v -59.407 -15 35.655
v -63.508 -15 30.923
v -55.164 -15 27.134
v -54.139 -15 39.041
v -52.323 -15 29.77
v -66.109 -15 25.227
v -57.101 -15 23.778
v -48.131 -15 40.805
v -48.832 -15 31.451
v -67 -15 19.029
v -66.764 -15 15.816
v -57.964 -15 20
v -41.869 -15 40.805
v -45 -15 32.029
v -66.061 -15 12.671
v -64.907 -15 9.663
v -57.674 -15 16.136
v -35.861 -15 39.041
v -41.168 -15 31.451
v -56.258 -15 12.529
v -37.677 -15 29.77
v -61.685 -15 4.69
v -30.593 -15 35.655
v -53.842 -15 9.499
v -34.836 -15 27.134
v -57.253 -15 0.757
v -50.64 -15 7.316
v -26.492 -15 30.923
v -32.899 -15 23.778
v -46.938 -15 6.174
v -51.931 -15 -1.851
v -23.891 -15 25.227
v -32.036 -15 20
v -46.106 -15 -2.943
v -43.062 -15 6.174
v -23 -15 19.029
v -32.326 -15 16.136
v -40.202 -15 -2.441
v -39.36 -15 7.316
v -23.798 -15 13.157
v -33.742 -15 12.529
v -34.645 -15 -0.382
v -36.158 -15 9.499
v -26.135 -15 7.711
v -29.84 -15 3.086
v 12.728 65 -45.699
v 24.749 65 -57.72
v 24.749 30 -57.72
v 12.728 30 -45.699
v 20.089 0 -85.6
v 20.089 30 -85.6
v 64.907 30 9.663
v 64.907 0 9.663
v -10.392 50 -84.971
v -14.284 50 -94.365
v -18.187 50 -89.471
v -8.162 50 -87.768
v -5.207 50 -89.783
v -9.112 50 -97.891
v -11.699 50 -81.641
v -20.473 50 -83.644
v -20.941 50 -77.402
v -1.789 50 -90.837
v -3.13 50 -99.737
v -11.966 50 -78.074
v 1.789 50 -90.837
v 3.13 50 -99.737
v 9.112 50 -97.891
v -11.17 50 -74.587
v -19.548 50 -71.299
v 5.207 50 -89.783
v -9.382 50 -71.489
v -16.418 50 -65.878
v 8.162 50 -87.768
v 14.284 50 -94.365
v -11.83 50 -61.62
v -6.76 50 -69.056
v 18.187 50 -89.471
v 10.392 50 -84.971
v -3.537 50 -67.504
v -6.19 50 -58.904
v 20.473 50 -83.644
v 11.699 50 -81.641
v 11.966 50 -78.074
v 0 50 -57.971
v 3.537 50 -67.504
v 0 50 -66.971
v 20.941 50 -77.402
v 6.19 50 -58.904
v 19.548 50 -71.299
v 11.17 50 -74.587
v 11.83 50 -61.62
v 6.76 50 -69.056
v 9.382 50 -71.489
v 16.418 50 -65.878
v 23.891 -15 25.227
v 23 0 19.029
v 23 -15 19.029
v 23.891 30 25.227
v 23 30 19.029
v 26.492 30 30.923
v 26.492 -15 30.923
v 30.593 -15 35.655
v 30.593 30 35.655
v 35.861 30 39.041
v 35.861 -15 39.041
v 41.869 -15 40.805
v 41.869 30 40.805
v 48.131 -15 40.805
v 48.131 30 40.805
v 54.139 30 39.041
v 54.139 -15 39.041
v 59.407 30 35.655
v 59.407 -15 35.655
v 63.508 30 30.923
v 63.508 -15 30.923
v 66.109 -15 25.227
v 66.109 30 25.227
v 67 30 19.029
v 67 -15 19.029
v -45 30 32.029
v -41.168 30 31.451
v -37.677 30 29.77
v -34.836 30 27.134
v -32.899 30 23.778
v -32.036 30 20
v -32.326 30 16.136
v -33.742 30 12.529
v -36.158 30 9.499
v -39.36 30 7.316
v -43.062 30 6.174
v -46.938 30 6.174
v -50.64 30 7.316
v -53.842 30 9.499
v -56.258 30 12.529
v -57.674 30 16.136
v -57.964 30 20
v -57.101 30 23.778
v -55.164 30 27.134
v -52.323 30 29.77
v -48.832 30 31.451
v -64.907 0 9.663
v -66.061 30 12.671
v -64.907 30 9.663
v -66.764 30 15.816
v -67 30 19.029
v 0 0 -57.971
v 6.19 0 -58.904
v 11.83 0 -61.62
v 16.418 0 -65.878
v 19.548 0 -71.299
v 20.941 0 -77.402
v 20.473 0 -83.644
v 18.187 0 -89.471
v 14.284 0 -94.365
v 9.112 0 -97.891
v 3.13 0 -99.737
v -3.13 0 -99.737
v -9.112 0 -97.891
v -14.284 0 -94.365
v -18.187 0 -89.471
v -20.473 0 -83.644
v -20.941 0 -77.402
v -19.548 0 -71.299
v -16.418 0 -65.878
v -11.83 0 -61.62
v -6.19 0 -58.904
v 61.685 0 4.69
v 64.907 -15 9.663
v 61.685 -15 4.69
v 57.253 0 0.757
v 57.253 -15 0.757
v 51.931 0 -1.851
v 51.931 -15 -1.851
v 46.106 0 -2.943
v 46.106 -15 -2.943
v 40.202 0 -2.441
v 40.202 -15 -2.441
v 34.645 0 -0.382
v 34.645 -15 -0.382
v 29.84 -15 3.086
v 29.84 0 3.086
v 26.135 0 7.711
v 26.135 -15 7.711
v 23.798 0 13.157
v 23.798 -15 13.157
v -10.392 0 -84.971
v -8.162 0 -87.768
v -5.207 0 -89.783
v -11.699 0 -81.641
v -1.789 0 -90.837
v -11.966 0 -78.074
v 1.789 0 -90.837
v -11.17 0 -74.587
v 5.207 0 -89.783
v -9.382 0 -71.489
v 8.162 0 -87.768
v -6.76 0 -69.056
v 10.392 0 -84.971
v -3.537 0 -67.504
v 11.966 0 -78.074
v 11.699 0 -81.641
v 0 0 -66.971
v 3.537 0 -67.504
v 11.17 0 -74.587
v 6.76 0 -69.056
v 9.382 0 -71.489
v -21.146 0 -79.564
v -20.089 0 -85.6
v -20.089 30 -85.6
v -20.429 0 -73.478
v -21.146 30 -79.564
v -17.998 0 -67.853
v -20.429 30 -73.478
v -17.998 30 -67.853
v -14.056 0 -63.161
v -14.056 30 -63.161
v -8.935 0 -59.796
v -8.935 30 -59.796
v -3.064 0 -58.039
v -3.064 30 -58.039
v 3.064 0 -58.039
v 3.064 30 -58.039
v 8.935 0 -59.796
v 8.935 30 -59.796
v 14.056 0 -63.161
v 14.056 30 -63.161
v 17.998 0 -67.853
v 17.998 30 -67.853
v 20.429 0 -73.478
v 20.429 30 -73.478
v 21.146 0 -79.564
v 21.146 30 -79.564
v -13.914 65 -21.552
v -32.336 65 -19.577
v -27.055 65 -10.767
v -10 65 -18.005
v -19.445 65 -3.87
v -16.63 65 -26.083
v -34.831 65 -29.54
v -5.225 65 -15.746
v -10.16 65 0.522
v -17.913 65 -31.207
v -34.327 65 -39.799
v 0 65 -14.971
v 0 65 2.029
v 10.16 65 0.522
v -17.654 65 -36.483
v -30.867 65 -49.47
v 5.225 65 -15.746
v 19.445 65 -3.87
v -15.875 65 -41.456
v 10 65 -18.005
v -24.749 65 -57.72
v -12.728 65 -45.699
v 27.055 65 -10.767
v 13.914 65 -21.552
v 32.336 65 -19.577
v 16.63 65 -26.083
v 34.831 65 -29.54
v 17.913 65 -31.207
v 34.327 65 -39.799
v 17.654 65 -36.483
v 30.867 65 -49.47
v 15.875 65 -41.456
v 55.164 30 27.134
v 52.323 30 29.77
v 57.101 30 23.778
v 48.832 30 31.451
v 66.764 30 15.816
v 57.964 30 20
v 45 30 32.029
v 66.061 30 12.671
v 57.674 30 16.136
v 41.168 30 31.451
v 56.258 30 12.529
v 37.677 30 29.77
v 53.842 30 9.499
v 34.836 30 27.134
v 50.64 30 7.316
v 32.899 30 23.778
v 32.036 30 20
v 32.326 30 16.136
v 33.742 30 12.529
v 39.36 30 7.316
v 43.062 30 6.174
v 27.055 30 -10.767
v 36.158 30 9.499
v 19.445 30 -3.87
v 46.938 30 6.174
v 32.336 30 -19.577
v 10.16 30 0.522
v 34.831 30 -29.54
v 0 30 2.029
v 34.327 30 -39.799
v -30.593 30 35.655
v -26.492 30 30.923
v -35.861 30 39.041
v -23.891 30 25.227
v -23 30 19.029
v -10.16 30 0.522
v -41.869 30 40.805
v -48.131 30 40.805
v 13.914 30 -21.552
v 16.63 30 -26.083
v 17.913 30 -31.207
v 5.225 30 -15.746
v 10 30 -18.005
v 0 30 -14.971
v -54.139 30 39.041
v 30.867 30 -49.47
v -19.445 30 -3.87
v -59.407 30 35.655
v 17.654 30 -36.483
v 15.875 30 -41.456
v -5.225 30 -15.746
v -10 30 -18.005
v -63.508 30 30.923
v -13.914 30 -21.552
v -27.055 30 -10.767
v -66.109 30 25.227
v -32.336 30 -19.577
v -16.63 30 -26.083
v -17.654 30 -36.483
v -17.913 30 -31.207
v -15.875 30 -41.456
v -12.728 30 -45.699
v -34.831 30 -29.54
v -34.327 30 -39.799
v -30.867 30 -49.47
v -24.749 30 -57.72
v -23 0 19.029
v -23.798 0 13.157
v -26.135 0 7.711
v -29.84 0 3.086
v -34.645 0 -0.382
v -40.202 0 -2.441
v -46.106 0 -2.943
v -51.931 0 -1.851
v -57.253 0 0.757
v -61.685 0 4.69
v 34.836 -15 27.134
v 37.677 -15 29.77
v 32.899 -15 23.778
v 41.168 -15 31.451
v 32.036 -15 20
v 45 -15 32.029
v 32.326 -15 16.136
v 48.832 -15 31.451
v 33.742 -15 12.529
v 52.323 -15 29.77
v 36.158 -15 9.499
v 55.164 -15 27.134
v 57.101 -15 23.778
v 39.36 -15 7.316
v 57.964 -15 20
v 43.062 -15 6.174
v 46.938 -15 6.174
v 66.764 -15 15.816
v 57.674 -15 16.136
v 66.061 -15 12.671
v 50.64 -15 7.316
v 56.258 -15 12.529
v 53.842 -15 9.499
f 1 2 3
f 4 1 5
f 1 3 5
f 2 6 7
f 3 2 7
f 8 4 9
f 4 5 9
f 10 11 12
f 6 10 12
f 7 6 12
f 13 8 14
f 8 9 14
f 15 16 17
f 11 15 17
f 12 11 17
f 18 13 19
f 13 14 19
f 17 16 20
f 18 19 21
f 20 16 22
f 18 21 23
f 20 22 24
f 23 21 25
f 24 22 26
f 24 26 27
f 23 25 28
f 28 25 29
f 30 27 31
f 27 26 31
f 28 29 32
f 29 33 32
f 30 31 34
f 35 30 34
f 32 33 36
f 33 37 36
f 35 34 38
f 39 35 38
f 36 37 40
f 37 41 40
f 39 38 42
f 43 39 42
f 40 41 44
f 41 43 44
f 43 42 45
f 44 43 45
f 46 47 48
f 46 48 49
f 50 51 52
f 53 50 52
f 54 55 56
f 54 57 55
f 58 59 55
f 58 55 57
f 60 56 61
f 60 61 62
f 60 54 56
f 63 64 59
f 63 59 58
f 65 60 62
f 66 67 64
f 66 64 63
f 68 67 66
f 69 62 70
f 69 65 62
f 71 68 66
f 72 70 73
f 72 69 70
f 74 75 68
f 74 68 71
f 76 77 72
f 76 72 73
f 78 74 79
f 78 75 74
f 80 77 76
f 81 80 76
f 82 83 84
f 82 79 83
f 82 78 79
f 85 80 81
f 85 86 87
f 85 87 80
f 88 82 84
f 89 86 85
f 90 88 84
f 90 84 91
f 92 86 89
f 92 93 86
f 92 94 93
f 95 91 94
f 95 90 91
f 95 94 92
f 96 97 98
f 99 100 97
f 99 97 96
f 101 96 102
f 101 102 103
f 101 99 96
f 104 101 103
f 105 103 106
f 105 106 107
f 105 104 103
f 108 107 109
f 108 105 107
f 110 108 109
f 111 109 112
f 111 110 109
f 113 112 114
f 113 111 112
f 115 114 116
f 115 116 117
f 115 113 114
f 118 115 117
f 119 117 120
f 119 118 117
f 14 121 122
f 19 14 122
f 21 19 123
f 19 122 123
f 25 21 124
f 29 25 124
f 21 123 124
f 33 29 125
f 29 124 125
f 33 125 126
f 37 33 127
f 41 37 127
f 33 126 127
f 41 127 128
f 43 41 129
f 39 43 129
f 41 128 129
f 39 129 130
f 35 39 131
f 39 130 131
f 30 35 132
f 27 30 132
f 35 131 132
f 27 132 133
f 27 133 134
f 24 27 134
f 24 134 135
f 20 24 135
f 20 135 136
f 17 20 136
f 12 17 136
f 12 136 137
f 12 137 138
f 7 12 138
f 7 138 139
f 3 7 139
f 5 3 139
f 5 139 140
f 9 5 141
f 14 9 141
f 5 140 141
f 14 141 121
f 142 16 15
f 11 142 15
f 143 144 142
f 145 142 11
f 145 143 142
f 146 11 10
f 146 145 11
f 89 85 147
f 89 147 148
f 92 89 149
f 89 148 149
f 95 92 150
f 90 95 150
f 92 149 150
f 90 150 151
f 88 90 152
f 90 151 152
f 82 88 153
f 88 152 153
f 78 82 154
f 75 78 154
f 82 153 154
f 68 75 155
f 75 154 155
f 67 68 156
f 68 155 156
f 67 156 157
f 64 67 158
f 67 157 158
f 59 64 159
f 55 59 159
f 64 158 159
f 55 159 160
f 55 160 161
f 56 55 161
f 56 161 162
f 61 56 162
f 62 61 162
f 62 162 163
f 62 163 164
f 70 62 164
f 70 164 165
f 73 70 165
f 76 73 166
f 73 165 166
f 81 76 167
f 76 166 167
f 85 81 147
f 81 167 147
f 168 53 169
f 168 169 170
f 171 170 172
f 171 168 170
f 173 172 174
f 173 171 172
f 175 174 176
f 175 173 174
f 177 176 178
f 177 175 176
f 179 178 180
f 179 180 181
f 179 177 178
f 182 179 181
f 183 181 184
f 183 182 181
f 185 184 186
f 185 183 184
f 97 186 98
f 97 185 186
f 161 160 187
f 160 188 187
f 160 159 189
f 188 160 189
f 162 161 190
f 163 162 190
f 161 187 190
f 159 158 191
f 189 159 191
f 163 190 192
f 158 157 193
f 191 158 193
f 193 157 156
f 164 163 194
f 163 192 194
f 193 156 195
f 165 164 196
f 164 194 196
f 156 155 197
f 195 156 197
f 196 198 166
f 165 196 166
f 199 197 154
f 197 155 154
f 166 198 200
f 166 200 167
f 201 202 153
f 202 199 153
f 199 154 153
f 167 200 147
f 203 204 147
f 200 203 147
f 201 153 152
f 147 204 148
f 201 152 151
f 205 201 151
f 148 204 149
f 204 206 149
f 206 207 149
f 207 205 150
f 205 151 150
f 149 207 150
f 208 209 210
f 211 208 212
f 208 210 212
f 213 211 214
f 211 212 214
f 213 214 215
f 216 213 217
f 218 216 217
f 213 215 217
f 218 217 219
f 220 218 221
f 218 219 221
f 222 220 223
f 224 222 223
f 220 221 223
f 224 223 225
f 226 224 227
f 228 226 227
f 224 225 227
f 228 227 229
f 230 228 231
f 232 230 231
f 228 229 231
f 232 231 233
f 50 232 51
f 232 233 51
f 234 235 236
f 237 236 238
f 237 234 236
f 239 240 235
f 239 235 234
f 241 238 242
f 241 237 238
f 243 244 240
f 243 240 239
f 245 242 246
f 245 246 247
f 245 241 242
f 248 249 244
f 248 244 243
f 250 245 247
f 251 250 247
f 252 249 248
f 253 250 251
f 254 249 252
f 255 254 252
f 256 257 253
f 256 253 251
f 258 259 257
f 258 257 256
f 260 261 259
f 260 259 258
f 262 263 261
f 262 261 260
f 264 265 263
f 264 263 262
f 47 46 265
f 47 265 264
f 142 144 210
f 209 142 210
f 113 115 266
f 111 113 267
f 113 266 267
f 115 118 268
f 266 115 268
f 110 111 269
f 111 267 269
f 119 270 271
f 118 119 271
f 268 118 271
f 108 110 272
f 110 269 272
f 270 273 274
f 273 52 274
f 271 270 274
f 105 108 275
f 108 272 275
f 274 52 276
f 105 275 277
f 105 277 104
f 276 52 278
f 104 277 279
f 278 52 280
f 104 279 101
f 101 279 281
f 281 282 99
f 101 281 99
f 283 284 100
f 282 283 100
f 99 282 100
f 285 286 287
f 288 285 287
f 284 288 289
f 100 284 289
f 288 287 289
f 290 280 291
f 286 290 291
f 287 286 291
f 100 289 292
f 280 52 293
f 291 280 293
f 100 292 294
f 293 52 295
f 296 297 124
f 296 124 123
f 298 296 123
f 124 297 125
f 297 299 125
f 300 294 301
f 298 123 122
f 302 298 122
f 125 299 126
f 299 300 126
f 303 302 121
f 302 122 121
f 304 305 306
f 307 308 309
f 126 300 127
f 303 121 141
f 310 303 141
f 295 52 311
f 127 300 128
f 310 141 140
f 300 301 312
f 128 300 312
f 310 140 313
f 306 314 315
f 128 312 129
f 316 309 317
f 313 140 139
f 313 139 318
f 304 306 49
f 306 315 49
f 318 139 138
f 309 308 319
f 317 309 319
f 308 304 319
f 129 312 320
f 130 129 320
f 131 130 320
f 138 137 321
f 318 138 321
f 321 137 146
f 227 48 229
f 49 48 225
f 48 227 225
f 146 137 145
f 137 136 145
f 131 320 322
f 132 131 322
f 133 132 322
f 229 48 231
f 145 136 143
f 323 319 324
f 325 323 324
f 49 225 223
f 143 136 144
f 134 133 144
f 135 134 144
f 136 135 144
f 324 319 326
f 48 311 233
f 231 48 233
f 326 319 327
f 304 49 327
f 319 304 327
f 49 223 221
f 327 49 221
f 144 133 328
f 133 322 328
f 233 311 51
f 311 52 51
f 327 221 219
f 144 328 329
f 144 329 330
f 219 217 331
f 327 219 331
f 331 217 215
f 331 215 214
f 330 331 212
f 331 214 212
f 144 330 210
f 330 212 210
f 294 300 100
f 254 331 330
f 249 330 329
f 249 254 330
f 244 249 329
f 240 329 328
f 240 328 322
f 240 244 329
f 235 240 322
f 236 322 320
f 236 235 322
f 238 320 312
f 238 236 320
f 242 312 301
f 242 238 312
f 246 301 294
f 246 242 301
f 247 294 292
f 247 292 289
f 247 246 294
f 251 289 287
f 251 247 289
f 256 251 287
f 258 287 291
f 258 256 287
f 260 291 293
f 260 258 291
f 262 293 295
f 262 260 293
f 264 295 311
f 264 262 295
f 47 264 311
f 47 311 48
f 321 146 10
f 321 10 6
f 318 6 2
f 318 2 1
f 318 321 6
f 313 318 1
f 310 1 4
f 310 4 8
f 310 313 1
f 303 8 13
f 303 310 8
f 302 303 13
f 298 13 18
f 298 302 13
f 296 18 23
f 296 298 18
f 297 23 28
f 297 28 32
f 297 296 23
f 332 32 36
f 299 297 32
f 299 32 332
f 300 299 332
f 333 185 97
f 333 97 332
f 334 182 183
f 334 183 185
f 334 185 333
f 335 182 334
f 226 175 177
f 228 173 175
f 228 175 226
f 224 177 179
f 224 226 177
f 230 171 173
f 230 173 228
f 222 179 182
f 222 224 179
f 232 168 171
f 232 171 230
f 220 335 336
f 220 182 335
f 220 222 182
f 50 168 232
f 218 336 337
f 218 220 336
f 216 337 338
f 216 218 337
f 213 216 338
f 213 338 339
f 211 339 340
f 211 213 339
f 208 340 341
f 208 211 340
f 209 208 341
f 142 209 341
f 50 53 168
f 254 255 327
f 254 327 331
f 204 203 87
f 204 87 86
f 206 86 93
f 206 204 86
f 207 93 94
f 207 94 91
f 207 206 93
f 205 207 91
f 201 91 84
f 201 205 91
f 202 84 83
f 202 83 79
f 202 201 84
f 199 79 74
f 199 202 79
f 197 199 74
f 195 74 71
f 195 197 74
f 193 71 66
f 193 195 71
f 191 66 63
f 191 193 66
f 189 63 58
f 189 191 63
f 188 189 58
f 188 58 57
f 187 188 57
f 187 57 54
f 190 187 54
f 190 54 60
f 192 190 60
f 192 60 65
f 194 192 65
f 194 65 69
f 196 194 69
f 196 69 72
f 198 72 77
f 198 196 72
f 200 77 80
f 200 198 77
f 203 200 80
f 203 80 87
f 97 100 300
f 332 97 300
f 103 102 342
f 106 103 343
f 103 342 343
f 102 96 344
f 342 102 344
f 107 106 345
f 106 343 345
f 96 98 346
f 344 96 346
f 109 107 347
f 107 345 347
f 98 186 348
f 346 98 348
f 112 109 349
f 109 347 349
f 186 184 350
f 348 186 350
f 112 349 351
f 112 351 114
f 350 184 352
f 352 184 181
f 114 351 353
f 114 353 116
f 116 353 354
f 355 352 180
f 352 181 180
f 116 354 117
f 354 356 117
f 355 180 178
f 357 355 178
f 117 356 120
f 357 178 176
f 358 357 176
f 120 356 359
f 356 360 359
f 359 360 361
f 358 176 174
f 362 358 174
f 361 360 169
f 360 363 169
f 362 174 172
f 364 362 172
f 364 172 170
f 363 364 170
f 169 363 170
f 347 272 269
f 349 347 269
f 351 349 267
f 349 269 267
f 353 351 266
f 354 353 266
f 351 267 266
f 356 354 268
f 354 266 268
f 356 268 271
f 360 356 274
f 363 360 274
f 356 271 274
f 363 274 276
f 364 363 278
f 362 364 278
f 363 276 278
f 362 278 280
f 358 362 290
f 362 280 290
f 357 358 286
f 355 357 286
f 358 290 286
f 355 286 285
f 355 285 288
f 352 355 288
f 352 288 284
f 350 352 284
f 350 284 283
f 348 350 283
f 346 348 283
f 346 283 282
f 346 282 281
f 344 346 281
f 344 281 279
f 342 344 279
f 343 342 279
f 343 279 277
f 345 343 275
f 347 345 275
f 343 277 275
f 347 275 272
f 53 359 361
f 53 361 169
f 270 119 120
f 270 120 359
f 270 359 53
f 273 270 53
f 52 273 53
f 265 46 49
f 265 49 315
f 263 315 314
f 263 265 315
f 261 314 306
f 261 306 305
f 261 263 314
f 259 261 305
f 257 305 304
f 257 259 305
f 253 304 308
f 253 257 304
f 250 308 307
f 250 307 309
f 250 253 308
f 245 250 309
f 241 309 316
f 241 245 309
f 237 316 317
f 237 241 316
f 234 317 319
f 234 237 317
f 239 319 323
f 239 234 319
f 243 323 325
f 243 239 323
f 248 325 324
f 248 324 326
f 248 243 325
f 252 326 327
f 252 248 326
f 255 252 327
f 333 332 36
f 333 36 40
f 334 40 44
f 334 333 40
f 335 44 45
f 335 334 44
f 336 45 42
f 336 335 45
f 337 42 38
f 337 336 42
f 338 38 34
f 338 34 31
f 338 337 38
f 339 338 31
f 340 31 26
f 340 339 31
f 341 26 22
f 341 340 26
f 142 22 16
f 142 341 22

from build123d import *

# Parameters (mm, degrees)
SKETCH1_R             = 21
SKETCH1_R_2           = 12
BOSS_EXTRUDE1_DEPTH   = 50
SKETCH2_R             = 13
BOSS_EXTRUDE2_DEPTH   = 45
BOSS_EXTRUDE2_2_DEPTH = 45
BOSS_EXTRUDE3_DEPTH   = 30
BOSS_EXTRUDE4_DEPTH   = 35


with BuildPart() as part:
    # Sketch1 → Boss-Extrude1 (new body)
    with BuildSketch(Plane(origin=(0, 0, 0), x_dir=(1, 0, 0), z_dir=(0, 1, 0))):
        with Locations(Location((0, 78.9710862, 0), (0, 0, 270))):
            Circle(SKETCH1_R)
        with Locations(Location((0, 78.9710862, 0), (0, 0, 270))):
            Circle(SKETCH1_R_2, mode=Mode.SUBTRACT)
    extrude(amount=BOSS_EXTRUDE1_DEPTH)


with BuildPart() as body_2:
    # Sketch2 → Boss-Extrude2 (new body)
    with BuildSketch(Plane(origin=(0, 30, 0), x_dir=(1, 0, 0), z_dir=(0, 1, 0))):
        with BuildLine():
            ThreePointArc((-23, -19.0289138), (-40.201759921, 2.441458626), (-64.906990195, -9.663459119))
            ThreePointArc((-64.906990195, -9.663459119), (-66.470372427, -14.230673721), (-67, -19.0289138))
            ThreePointArc((-67, -19.0289138), (-45, -41.0289138), (-23, -19.0289138))
        make_face()
        with Locations(Location((-45, -19.0289138, 0), (0, 0, 270))):
            Circle(SKETCH2_R, mode=Mode.SUBTRACT)
    extrude(amount=-BOSS_EXTRUDE2_DEPTH)



with BuildPart() as body_3:
    # Sketch2 → Boss-Extrude2 2 (new body)
    with BuildSketch(Plane(origin=(0, 30, 0), x_dir=(1, 0, 0), z_dir=(0, 1, 0))):
        with BuildLine():
            ThreePointArc((64.906990195, -9.663459119), (40.201759921, 2.441458626), (23, -19.0289138))
            ThreePointArc((23, -19.0289138), (45, -41.0289138), (67, -19.0289138))
            ThreePointArc((67, -19.0289138), (66.470372427, -14.230673721), (64.906990195, -9.663459119))
        make_face()
        with Locations(Location((45, -19.0289138, 0), (0, 0, 270))):
            Circle(SKETCH2_R, mode=Mode.SUBTRACT)
    extrude(amount=-BOSS_EXTRUDE2_2_DEPTH)


with BuildPart() as body_2_1:
    add(body_2.part)

    add(body_3.part)  # Boss-Extrude3 merges body 3
    # Sketch3 → Boss-Extrude3 (add)
    with BuildSketch(Plane(origin=(0, 30, 0), x_dir=(1, 0, 0), z_dir=(0, 1, 0))):
        with BuildLine():
            Line((-64.906990195, -9.663459119), (-20.089465247, 85.5996178))
            ThreePointArc((-20.089465247, 85.5996178), (0, 57.816322077), (20.089465247, 85.5996178))
            Line((20.089465247, 85.5996178), (64.906990195, -9.663459119))
            ThreePointArc((64.906990195, -9.663459119), (40.201759921, 2.441458626), (23, -19.0289138))
            Line((23, -19.0289138), (-23, -19.0289138))
            ThreePointArc((-23, -19.0289138), (-40.201759921, 2.441458626), (-64.906990195, -9.663459119))
        make_face()
    extrude(amount=-BOSS_EXTRUDE3_DEPTH)

    # Sketch5 → Boss-Extrude4 (add)
    with BuildSketch(Plane(origin=(0, 65, 0), x_dir=(1, 0, 0), z_dir=(0, 1, 0))):
        with BuildLine():
            Line((-12.727922061, 45.699008261), (-24.748737342, 57.719823541))
            ThreePointArc((-24.748737342, 57.719823541), (0, -2.0289138), (24.748737342, 57.719823541))
            Line((24.748737342, 57.719823541), (12.727922061, 45.699008261))
            ThreePointArc((12.727922061, 45.699008261), (0, 14.9710862), (-12.727922061, 45.699008261))
        make_face()
    extrude(amount=-BOSS_EXTRUDE4_DEPTH)


solid = Compound([part.part, body_2_1.part])
